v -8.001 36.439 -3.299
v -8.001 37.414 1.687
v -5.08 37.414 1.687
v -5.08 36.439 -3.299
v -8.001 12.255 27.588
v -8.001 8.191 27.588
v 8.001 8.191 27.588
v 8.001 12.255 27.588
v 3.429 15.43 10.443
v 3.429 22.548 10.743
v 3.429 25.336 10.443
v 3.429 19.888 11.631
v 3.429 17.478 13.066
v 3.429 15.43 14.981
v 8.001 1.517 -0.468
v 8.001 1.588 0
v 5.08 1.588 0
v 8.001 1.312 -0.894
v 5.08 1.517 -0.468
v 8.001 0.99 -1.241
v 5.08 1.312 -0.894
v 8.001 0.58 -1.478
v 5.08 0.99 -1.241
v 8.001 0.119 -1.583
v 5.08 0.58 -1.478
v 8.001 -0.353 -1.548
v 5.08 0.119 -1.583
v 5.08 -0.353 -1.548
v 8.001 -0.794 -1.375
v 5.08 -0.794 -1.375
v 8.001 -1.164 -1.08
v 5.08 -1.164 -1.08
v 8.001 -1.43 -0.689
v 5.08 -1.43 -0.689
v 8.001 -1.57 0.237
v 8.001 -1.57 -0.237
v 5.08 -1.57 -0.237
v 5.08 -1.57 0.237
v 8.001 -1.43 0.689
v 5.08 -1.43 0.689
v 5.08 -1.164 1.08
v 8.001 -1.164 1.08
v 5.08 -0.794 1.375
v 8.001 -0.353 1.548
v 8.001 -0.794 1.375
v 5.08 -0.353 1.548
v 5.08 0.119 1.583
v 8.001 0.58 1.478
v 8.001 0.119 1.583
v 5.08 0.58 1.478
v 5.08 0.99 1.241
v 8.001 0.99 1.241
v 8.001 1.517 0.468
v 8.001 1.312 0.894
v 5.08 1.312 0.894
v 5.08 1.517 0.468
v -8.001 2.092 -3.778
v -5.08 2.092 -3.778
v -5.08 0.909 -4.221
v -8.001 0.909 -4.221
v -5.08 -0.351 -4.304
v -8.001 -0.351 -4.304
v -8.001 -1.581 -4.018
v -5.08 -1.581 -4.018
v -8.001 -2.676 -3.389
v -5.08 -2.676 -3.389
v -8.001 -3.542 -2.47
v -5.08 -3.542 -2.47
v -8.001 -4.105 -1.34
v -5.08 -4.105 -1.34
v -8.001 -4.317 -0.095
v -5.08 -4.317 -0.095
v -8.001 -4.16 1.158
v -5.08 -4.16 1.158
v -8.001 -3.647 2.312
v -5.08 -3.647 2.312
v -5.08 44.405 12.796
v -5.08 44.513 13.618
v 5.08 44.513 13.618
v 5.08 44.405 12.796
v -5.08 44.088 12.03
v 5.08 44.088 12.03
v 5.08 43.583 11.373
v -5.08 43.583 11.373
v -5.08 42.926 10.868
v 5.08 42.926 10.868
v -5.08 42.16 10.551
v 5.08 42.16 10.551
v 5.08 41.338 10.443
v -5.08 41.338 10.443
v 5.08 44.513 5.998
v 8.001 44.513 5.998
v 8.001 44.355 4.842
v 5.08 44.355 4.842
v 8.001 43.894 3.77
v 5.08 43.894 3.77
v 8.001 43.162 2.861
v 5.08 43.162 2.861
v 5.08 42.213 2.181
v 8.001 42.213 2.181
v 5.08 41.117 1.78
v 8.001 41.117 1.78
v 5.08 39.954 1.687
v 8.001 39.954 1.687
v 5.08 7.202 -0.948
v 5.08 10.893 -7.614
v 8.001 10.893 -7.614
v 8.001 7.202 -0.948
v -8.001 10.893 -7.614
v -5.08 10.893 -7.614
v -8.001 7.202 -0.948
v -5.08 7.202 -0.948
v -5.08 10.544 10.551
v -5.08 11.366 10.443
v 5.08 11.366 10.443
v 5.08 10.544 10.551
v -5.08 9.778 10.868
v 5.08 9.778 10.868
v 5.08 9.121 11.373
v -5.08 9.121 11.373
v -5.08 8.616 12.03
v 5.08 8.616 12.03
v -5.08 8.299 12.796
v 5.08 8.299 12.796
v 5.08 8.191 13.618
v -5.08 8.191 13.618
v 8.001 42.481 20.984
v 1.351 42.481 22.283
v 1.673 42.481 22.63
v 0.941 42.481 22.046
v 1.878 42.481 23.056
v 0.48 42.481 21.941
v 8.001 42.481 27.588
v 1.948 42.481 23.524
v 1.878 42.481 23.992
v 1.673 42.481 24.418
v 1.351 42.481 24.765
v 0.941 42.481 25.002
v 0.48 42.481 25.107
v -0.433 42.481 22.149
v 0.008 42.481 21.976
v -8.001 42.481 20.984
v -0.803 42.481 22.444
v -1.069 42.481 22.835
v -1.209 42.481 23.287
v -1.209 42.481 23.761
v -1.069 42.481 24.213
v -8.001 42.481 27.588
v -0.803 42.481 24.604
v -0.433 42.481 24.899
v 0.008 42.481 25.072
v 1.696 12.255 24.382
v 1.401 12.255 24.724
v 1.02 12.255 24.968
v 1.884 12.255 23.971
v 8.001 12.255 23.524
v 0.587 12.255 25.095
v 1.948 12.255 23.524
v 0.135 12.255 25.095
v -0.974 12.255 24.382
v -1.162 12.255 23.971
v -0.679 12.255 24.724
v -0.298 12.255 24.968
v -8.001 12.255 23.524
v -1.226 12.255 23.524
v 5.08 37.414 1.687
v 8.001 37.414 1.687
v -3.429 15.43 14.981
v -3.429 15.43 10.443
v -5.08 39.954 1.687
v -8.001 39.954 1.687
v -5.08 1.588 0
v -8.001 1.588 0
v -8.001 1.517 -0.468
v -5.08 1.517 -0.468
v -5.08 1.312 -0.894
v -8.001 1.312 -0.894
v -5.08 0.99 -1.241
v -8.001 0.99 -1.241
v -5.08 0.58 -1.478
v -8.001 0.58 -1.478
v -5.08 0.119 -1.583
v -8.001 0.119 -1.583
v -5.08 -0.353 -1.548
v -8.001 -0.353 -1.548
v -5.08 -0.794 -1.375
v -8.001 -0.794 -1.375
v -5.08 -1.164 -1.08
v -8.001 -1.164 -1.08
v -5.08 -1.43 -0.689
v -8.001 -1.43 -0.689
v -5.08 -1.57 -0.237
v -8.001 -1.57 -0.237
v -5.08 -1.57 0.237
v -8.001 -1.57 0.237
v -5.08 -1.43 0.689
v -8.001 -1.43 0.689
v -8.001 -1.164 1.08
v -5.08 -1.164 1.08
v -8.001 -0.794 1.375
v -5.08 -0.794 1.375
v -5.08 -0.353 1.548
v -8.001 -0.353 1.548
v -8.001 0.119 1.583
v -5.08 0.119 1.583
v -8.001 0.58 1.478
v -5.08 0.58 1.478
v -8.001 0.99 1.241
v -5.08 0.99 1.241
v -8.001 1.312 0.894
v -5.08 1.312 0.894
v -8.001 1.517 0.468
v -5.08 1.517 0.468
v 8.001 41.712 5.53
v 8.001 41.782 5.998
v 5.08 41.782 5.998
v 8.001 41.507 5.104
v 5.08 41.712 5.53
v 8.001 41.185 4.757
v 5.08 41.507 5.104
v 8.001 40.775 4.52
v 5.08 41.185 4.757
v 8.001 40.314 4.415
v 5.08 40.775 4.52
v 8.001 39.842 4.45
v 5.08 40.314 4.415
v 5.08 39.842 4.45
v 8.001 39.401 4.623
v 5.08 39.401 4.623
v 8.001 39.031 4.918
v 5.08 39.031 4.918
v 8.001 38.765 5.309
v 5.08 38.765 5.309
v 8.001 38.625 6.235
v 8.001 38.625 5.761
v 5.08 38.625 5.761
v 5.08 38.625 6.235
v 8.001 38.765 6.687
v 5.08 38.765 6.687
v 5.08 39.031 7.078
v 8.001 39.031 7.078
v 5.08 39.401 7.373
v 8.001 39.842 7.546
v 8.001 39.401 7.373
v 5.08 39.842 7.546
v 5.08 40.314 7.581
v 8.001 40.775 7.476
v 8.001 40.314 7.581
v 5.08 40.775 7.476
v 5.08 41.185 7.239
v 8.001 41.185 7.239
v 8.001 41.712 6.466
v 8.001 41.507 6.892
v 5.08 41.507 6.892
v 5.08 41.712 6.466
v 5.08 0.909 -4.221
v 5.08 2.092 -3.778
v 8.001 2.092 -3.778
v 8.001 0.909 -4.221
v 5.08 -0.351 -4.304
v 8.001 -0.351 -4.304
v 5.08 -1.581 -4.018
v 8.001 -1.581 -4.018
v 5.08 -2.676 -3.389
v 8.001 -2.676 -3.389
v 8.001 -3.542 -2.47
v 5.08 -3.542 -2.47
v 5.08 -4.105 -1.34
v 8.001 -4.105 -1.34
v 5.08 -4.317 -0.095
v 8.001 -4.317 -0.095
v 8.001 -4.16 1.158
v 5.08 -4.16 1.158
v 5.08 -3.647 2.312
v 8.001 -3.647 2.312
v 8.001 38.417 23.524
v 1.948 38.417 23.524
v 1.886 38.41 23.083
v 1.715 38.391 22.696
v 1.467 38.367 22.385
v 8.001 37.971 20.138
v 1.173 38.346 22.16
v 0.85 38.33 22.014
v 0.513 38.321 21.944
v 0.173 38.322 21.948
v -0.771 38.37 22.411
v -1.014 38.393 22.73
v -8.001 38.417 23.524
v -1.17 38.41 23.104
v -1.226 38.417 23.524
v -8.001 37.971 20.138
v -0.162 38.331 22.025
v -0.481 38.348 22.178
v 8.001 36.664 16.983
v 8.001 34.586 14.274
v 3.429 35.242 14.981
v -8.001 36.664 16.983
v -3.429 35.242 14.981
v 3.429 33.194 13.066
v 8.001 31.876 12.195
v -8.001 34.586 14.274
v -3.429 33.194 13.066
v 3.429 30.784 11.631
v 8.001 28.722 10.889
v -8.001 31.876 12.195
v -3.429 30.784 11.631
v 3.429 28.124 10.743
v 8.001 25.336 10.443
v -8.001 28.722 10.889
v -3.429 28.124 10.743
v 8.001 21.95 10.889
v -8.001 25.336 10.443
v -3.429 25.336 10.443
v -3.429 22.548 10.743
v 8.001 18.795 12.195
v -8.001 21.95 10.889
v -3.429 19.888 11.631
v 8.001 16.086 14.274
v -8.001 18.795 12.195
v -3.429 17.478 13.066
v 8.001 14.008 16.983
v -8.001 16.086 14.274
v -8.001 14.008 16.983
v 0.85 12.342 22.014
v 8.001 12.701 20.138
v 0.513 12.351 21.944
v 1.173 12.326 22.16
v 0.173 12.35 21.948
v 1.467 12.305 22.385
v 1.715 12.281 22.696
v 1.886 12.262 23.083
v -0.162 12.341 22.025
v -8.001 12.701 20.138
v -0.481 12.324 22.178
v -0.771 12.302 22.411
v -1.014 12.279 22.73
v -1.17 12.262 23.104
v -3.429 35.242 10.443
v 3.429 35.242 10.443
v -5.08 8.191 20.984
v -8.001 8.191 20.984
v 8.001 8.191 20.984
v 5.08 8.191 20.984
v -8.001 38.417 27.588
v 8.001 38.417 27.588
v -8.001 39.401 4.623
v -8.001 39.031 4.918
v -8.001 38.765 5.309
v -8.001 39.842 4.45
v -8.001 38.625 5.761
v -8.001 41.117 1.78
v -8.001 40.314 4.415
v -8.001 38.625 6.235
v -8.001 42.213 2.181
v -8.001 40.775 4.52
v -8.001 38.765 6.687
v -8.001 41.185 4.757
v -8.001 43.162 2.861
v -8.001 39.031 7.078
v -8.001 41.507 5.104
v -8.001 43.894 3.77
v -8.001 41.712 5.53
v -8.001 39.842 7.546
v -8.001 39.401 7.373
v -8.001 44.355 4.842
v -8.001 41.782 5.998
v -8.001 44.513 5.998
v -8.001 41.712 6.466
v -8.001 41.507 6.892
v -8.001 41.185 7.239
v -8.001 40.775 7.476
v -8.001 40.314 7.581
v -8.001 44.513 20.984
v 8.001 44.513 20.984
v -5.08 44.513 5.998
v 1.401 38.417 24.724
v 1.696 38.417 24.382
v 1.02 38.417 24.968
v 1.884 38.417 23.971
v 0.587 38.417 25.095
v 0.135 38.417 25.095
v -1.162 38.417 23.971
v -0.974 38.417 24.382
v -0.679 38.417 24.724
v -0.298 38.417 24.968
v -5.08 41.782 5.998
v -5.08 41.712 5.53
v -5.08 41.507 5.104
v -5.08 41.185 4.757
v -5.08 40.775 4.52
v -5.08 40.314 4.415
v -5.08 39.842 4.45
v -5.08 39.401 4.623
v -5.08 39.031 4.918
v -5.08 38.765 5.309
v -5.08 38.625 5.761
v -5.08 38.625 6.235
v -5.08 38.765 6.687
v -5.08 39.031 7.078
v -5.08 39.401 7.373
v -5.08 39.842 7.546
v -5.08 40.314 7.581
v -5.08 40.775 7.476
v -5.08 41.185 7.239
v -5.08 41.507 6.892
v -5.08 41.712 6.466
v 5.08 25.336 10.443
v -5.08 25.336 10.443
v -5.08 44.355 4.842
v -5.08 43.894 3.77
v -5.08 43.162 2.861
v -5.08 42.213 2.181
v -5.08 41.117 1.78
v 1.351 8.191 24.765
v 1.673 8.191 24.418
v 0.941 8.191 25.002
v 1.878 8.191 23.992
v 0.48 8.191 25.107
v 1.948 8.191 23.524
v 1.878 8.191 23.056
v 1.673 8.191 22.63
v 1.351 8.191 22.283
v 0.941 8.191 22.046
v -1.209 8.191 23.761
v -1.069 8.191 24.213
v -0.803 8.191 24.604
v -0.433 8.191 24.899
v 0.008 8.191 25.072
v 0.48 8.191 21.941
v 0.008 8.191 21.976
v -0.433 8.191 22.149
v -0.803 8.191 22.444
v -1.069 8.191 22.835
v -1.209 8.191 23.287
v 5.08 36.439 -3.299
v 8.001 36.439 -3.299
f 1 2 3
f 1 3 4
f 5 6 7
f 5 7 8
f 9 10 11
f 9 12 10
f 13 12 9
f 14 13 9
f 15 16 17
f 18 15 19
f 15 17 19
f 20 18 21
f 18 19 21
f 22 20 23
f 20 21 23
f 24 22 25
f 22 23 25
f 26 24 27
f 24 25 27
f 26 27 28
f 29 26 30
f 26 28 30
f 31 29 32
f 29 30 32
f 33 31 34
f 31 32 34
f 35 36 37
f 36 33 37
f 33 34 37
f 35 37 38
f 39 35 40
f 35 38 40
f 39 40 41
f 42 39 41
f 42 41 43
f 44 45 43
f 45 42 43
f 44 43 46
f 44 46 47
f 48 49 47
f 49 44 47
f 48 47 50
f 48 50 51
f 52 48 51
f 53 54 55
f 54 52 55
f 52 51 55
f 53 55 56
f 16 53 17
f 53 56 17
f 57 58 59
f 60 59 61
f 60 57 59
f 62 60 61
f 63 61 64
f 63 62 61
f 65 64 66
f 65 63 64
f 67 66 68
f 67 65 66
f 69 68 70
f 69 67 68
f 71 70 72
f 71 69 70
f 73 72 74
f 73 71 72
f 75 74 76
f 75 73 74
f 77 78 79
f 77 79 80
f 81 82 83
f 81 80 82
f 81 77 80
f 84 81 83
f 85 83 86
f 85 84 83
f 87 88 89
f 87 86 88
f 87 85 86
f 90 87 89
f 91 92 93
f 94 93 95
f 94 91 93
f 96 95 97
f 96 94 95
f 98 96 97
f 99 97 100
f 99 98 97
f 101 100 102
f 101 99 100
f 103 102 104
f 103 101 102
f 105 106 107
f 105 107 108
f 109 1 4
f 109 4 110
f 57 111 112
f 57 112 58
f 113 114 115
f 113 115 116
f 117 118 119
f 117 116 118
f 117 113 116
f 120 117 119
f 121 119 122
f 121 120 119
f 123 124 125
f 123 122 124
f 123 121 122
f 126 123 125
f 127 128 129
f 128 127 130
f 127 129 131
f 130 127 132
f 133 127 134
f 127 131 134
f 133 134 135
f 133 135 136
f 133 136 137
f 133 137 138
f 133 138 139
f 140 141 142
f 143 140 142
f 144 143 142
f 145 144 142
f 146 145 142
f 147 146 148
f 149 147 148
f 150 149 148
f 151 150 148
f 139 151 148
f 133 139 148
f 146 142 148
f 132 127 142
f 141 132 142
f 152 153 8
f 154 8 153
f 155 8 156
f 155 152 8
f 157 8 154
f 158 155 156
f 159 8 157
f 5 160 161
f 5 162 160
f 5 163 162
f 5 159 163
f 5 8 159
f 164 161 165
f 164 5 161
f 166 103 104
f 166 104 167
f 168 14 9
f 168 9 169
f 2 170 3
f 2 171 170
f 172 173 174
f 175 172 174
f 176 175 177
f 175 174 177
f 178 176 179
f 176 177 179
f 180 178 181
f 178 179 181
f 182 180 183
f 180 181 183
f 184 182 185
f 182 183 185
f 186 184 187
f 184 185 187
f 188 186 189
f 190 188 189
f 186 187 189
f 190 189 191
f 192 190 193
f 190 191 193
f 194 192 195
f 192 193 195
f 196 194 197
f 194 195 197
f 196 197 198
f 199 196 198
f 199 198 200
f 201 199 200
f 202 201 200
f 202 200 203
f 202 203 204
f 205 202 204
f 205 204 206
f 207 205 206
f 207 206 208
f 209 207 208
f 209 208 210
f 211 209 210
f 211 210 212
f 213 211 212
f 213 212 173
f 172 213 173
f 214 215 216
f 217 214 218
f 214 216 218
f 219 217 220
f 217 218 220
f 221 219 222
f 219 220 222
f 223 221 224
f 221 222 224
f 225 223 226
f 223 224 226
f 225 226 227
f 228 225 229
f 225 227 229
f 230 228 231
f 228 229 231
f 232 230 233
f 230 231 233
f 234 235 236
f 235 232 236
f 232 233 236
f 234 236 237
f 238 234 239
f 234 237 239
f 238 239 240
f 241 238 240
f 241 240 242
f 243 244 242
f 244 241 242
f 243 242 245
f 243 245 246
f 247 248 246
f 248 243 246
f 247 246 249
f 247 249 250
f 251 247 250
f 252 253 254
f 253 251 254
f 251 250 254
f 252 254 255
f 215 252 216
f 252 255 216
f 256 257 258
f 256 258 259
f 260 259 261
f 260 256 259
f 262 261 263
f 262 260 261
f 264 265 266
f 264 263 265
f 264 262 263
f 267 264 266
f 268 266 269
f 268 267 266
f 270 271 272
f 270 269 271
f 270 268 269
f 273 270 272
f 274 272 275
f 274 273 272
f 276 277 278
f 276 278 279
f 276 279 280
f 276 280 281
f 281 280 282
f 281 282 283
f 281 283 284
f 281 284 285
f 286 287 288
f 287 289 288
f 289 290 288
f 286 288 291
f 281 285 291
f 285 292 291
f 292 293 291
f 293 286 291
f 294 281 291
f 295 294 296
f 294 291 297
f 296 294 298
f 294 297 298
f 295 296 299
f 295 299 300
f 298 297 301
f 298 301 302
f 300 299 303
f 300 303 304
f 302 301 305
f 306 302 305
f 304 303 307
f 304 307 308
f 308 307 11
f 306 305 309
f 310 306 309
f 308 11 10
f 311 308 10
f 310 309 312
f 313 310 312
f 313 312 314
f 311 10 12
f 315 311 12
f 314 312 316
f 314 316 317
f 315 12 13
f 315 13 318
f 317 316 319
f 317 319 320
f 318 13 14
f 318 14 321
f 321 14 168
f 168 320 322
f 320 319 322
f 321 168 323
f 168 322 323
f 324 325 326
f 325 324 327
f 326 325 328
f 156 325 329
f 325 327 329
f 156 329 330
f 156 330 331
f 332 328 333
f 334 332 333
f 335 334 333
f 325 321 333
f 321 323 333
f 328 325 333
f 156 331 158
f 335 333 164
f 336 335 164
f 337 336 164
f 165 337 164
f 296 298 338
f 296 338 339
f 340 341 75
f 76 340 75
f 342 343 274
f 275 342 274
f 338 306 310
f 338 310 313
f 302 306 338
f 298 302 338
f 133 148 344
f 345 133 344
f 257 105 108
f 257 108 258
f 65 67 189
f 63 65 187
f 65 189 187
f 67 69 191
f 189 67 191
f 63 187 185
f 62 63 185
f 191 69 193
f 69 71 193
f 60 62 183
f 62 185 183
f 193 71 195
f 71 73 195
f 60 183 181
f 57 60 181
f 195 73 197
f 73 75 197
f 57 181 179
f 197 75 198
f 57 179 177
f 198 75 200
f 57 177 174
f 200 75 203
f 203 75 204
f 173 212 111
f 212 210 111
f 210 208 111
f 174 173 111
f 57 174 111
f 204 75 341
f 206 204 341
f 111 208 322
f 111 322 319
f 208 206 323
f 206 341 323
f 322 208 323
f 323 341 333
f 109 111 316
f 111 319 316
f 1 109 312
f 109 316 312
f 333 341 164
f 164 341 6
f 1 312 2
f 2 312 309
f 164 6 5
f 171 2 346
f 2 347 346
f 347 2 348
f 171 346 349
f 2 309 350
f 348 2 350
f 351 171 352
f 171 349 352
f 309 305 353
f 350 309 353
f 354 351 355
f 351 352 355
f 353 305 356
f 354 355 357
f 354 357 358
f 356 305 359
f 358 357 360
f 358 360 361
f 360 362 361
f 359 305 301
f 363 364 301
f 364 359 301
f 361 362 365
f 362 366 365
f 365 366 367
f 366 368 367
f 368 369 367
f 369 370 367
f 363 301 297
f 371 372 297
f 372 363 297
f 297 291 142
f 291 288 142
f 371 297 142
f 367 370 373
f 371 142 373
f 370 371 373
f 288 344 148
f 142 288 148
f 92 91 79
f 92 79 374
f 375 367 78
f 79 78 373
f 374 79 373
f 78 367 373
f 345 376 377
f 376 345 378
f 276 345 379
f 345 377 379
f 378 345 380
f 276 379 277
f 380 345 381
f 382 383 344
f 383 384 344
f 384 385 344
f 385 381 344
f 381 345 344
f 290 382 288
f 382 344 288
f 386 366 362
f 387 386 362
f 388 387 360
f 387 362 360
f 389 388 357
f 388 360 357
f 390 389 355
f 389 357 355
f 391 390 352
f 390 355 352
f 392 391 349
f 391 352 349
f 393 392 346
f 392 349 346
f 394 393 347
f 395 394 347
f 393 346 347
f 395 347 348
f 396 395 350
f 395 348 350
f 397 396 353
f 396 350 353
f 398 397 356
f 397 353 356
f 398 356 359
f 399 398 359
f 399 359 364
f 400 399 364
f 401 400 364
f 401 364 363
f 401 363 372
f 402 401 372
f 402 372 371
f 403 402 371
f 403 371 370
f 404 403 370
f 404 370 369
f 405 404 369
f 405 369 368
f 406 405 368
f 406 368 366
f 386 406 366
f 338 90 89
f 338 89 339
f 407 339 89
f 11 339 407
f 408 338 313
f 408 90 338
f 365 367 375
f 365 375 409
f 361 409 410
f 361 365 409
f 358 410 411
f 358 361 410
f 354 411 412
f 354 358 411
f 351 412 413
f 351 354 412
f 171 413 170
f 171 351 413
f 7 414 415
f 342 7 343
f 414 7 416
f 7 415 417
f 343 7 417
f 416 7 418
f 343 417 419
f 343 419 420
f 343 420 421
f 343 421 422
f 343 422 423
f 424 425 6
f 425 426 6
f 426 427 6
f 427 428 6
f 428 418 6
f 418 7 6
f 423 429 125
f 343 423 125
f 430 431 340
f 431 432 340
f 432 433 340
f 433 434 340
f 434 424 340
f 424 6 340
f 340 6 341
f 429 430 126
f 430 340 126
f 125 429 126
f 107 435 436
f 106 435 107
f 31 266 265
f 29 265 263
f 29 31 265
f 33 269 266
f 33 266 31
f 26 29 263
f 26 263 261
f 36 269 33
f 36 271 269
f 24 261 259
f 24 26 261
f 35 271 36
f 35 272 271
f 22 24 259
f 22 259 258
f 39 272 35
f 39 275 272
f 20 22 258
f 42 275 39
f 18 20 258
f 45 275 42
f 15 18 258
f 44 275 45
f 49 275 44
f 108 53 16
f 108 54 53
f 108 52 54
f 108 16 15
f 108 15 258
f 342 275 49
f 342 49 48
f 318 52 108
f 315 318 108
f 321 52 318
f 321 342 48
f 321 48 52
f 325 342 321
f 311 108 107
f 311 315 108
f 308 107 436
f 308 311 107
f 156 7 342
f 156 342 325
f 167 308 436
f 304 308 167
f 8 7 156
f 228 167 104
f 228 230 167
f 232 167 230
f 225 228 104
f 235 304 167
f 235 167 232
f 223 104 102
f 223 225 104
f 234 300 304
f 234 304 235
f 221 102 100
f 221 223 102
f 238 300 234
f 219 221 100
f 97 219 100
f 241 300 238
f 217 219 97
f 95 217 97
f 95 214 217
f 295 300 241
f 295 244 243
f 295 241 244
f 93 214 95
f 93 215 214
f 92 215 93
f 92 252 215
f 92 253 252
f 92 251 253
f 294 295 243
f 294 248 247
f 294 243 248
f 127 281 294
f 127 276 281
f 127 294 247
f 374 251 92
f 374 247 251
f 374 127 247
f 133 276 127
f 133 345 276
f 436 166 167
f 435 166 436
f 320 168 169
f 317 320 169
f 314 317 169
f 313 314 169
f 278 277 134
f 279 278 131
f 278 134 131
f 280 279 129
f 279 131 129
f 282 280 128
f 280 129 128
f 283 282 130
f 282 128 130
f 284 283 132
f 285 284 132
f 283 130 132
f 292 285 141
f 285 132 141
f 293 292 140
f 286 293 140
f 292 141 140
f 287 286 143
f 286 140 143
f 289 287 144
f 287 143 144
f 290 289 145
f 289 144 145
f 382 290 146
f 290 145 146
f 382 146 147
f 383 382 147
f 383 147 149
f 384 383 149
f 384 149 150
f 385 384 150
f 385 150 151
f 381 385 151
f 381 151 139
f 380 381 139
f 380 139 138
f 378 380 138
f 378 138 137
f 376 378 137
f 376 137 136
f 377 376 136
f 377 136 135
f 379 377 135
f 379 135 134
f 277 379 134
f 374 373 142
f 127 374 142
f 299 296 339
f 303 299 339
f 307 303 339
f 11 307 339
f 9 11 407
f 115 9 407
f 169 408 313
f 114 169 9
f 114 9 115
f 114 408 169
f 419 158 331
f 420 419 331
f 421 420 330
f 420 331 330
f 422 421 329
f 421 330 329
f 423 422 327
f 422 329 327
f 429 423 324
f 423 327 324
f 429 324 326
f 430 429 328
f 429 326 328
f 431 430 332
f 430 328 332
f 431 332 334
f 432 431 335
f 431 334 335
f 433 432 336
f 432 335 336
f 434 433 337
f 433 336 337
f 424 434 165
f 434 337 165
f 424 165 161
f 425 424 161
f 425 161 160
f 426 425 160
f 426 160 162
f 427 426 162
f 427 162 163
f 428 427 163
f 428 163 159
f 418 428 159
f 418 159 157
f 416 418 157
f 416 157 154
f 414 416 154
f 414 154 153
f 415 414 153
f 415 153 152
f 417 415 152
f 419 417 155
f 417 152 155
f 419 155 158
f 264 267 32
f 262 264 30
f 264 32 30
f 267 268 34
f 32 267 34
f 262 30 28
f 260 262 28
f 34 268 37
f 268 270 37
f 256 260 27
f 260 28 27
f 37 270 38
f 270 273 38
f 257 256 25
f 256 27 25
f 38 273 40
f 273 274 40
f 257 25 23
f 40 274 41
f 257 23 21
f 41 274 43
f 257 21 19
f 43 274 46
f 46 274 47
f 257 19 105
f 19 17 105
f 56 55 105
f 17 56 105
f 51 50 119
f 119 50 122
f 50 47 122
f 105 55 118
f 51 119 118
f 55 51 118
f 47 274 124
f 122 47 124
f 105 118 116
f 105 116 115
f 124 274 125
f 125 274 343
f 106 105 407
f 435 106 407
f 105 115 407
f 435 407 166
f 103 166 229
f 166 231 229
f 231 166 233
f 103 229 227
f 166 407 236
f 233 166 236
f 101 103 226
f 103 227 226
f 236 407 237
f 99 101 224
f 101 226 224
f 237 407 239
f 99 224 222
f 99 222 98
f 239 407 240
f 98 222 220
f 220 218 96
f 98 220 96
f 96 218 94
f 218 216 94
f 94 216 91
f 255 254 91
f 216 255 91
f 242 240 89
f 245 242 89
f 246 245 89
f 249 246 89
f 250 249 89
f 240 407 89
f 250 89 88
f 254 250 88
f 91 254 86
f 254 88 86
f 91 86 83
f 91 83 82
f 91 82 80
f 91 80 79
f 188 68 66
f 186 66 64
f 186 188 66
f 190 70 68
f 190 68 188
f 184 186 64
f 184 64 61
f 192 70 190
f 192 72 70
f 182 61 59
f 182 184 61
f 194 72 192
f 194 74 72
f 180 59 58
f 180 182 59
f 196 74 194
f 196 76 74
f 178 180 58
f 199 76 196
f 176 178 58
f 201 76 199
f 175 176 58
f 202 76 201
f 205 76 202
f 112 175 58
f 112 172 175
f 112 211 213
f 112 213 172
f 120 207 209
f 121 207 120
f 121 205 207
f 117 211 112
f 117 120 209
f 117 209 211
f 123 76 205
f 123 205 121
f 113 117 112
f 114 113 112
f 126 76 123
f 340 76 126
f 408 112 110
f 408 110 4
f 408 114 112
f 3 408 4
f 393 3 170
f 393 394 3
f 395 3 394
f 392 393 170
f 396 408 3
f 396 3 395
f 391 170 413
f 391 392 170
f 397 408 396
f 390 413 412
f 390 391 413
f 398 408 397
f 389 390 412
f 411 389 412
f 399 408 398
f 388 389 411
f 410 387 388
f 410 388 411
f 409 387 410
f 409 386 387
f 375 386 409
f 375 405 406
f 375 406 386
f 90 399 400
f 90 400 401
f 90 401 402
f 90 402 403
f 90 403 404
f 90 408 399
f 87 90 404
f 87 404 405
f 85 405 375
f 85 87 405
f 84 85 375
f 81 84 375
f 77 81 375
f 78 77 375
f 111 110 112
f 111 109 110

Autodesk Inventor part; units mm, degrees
ref_plane "YZ Plane" through (0, 0, 0) normal (1, 0, 0) x (0, 1, 0)
ref_plane "XZ Plane" through (0, 0, 0) normal (0, 1, 0) x (-1, 0, 0)
ref_plane "XY Plane" through (0, 0, 0) normal (0, 0, 1) x (1, 0, 0)
sketch "Sketch1" plane through (0, 0, 0) normal (1, 0, 0) x (0, 1, 0)
  arc A0 (39.954, 1.6866) -> (44.513, 5.9979) centre (40.195, 5.9979) ccw
  circle A1 centre (40.195, 5.9979) radius 1.5875
  line L0 (44.513, 5.9979) -> (44.513, 20.9839)
  line L1 (44.513, 20.9839) -> (42.481, 20.9839)
  line L2 (42.481, 20.9839) -> (42.481, 27.5879)
  line L3 (42.481, 27.5879) -> (38.417, 27.5879)
  line L4 (38.417, 27.5879) -> (38.417, 23.5239)
  line L5 (39.954, 1.6866) -> (37.414, 1.6866)
  line L6 (37.414, 1.6866) -> (36.4393, -3.299)
  line L7 (36.4393, -3.299) -> (10.8933, -7.6145)
  line L8 (10.8933, -7.6145) -> (7.2025, -0.948)
  line L9 (7.2025, -0.948) -> (2.0915, -3.7777)
  arc A2 (-3.6468, 2.3121) -> (2.0915, -3.7777) centre (0, 0) ccw
  circle A3 centre (0, 0) radius 1.5875
  line L10 (8.191, 27.5879) -> (12.255, 27.5879)
  line L11 (12.255, 27.5879) -> (12.255, 23.5239)
  arc A4 (12.255, 23.5239) -> (38.417, 23.5239) centre (25.336, 23.5239) ccw
  line L12 (81.5814, 1.6799) -> (58.7298, 1.6799) construction
  line L13 (40.195, 5.9979) -> (0, 0) construction
  line L14 (8.191, 27.5879) -> (10.8933, -7.6145) construction
  line L15 (60.3567, 10.4429) -> (44.3212, 10.4429) construction
  line L16 (8.191, 27.5879) -> (0, 0) construction
  line L17 (-6.8832, 3.5179) -> (4.3798, -16.8256) construction
  line L18 (8.191, 27.5879) -> (8.191, 20.9839)
  line L19 (8.191, 20.9839) -> (-3.6468, 2.3121)
  dimension "d0" = 8.636
  dimension "d1" = 3.175
  dimension "d2" = 4.064
  dimension "d3" = 6.604
  dimension "d4" = 2.032
  dimension "d5" = 25.908
  dimension "d6" = 2.54
  dimension "d7" = 5.08
  dimension "d8" = 25.908
  dimension "d9" = 7.62
  dimension "d10" = 40.64
  dimension "d11" = 35.306
  dimension "d12" = 26.162
  dimension "d13" = 17.145
  dimension "d14" = 28.7782
  dimension "d15" = 10.16
extrude "Extrusion1" add sketch "Sketch1" along normal mid plane 16.002
sketch "Sketch2" plane through (0, 0, 0) normal (1, 0, 0) x (0, 1, 0)
  line L0 (38.417, 27.5879) -> (42.481, 27.5879) projected
  line L1 (8.191, 27.5879) -> (12.255, 27.5879) projected
  line L2 (41.338, 10.4429) -> (11.366, 10.4429)
  line L3 (44.513, 20.9839) -> (44.513, 5.9979) projected
  arc A0 (41.338, 10.4429) -> (44.513, 13.6179) centre (41.338, 13.6179) ccw
  line L4 (8.191, 27.5879) -> (8.191, 13.6179)
  arc A1 (8.191, 13.6179) -> (11.366, 10.4429) centre (11.366, 13.6179) ccw
  line L5 (44.513, 13.6179) -> (46.9295, 13.6179)
  line L6 (46.9295, 13.6179) -> (49.0826, -15.2272)
  line L7 (49.0826, -15.2272) -> (-26.66, -17.9242)
  line L8 (-26.66, -17.9242) -> (-26.66, 23.5652)
  line L9 (-26.66, 23.5652) -> (8.191, 27.5879)
  point P0 (0, 0)
  point P1 (44.513, 3.2824)
  dimension "d18" = 17.145
  dimension "d19" = 3.175
  dimension "d20" = 3.175
extrude "Extrusion2" cut sketch "Sketch2" along normal mid plane 10.16
sketch "Sketch3" plane through (-8.001, 38.417, 27.5879) normal (0, 0, 1) x (1, 0, 0)
  line L0 (16.002, -26.162) -> (0, -26.162) projected
  line L1 (16.002, -30.226) -> (0, -30.226) projected
  line L2 (0, -30.226) -> (0, -26.162) projected
  line L3 (16.002, -26.162) -> (16.002, -30.226) projected
  line L4 (0, 4.064) -> (16.002, -30.226) construction
  line L5 (4.572, -3.175) -> (11.43, -3.175)
  line L6 (11.43, -3.175) -> (11.43, -22.987)
  line L7 (11.43, -22.987) -> (4.572, -22.987)
  line L8 (4.572, -22.987) -> (4.572, -3.175)
  line L9 (11.43, -3.175) -> (4.572, -22.987) construction
  point P0 (8.001, -38.417)
  point P1 (8.001, -13.081)
  dimension "d23" = 6.858
  dimension "d24" = 19.812
extrude "Extrusion3" cut sketch "Sketch3" against normal through all contours L5 L6 L7 L8
sketch "Sketch4" plane through (-8.001, 42.481, 27.5879) normal (0, 1, 0) x (1, 0, 0)
  line L0 (16.002, 0) -> (0, 0) projected
  circle A0 centre (8.362, 4.064) radius 1.5875
  point P0 (8.001, 27.5879)
  dimension "d27" = 3.175
  dimension "d28" = 4.064
extrude "Extrusion4" cut sketch "Sketch4" against normal through all
properties part number "Front Axle Housing" material "ABS Plastic"
